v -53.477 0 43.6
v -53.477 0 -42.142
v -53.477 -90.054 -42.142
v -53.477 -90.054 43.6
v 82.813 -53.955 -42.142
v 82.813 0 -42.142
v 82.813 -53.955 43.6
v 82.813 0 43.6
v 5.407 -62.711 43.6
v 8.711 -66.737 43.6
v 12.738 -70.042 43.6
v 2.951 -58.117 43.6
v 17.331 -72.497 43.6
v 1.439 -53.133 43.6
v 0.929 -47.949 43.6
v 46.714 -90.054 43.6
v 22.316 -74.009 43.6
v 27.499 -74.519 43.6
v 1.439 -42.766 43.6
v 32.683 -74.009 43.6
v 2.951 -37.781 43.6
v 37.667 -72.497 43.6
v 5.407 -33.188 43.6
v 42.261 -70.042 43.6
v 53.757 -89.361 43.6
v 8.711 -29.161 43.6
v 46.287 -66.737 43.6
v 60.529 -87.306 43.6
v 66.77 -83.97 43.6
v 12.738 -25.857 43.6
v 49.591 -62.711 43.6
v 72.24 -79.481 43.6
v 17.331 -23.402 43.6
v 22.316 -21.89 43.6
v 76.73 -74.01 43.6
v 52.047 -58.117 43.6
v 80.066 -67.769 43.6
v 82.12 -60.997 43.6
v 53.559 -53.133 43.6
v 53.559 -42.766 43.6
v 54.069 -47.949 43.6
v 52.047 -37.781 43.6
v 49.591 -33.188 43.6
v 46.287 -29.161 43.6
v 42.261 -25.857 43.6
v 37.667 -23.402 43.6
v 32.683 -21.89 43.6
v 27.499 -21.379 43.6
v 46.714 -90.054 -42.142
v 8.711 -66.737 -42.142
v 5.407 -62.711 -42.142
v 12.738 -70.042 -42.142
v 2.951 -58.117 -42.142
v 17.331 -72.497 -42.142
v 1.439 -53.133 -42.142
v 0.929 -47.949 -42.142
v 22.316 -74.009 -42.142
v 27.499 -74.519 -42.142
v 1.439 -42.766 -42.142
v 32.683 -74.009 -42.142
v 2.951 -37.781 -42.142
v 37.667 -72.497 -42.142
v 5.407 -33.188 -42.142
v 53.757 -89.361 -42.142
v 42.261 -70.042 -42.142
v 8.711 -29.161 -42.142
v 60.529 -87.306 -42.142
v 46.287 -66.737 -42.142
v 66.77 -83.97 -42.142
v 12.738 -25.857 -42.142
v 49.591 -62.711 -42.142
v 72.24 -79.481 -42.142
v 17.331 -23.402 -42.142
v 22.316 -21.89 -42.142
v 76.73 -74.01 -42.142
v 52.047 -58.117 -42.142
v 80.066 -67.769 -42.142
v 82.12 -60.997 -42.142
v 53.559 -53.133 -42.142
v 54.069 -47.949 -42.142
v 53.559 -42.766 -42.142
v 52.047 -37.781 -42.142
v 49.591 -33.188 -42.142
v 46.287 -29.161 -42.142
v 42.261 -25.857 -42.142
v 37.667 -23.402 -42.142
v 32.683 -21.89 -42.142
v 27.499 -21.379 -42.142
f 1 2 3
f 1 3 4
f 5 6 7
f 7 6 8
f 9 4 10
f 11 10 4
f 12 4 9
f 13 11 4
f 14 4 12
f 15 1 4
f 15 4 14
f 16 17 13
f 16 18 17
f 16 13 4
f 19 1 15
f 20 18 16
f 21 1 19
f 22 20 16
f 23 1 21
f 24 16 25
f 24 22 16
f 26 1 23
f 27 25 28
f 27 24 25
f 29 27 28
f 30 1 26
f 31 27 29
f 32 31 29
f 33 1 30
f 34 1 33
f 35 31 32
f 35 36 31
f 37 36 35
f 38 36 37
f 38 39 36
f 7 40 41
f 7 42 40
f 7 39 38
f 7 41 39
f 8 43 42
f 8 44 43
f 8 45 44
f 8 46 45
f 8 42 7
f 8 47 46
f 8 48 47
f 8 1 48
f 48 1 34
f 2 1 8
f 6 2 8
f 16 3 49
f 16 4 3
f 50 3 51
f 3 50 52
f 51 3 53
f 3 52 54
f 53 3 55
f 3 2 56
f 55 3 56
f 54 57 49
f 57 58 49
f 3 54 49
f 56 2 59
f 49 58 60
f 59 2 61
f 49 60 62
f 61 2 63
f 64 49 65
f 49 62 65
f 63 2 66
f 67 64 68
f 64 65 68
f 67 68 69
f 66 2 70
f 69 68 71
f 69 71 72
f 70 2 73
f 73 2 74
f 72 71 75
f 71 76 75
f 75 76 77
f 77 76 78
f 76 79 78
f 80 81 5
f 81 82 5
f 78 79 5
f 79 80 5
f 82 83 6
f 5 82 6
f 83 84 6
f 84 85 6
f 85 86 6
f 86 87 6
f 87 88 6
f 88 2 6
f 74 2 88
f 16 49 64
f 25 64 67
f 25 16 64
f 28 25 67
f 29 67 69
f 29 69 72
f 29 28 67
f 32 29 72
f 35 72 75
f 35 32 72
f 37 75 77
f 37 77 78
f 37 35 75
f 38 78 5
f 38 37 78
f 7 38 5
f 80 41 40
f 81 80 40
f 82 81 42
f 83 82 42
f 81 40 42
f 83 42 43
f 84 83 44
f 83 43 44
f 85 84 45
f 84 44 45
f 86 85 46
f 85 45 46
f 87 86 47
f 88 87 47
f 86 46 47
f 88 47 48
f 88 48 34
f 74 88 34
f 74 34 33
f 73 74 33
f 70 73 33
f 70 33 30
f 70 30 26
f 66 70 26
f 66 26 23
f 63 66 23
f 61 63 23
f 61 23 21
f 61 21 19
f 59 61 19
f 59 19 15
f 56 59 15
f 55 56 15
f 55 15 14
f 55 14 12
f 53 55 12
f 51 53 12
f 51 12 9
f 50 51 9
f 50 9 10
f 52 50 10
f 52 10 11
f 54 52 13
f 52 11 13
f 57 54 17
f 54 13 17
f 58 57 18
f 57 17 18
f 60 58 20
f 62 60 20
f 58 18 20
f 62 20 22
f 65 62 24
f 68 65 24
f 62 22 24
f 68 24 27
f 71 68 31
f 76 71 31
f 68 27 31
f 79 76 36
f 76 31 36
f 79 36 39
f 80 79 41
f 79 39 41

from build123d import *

# Parameters (mm, degrees)
F0_W     = 136.290834
F0_H     = 85.74231
F1_DEPTH = 90.054186
F2_R     = 26.57018
F3_DEPTH = 175.134316
F4_R     = 36.09963


with BuildPart() as f1:
    # F0 (on Front) → F1 (new body)
    with BuildSketch(Plane.XZ):
        with Locations((14.668025, 0.729218)):
            Rectangle(F0_W, F0_H)
    extrude(amount=F1_DEPTH)

    # F2 (on face) → F3 (cut)
    with BuildSketch(Plane.XY.offset(43.600373)):
        with Locations((27.499106, -47.949214)):
            Circle(F2_R)
    extrude(amount=-F3_DEPTH, mode=Mode.SUBTRACT)

    # F4
    f4_edges = [f1.edges().sort_by_distance(p)[0] for p in [
        (82.813442, -90.054186, 0.729218),
    ]]
    fillet(f4_edges, radius=F4_R)


solid = f1.part
